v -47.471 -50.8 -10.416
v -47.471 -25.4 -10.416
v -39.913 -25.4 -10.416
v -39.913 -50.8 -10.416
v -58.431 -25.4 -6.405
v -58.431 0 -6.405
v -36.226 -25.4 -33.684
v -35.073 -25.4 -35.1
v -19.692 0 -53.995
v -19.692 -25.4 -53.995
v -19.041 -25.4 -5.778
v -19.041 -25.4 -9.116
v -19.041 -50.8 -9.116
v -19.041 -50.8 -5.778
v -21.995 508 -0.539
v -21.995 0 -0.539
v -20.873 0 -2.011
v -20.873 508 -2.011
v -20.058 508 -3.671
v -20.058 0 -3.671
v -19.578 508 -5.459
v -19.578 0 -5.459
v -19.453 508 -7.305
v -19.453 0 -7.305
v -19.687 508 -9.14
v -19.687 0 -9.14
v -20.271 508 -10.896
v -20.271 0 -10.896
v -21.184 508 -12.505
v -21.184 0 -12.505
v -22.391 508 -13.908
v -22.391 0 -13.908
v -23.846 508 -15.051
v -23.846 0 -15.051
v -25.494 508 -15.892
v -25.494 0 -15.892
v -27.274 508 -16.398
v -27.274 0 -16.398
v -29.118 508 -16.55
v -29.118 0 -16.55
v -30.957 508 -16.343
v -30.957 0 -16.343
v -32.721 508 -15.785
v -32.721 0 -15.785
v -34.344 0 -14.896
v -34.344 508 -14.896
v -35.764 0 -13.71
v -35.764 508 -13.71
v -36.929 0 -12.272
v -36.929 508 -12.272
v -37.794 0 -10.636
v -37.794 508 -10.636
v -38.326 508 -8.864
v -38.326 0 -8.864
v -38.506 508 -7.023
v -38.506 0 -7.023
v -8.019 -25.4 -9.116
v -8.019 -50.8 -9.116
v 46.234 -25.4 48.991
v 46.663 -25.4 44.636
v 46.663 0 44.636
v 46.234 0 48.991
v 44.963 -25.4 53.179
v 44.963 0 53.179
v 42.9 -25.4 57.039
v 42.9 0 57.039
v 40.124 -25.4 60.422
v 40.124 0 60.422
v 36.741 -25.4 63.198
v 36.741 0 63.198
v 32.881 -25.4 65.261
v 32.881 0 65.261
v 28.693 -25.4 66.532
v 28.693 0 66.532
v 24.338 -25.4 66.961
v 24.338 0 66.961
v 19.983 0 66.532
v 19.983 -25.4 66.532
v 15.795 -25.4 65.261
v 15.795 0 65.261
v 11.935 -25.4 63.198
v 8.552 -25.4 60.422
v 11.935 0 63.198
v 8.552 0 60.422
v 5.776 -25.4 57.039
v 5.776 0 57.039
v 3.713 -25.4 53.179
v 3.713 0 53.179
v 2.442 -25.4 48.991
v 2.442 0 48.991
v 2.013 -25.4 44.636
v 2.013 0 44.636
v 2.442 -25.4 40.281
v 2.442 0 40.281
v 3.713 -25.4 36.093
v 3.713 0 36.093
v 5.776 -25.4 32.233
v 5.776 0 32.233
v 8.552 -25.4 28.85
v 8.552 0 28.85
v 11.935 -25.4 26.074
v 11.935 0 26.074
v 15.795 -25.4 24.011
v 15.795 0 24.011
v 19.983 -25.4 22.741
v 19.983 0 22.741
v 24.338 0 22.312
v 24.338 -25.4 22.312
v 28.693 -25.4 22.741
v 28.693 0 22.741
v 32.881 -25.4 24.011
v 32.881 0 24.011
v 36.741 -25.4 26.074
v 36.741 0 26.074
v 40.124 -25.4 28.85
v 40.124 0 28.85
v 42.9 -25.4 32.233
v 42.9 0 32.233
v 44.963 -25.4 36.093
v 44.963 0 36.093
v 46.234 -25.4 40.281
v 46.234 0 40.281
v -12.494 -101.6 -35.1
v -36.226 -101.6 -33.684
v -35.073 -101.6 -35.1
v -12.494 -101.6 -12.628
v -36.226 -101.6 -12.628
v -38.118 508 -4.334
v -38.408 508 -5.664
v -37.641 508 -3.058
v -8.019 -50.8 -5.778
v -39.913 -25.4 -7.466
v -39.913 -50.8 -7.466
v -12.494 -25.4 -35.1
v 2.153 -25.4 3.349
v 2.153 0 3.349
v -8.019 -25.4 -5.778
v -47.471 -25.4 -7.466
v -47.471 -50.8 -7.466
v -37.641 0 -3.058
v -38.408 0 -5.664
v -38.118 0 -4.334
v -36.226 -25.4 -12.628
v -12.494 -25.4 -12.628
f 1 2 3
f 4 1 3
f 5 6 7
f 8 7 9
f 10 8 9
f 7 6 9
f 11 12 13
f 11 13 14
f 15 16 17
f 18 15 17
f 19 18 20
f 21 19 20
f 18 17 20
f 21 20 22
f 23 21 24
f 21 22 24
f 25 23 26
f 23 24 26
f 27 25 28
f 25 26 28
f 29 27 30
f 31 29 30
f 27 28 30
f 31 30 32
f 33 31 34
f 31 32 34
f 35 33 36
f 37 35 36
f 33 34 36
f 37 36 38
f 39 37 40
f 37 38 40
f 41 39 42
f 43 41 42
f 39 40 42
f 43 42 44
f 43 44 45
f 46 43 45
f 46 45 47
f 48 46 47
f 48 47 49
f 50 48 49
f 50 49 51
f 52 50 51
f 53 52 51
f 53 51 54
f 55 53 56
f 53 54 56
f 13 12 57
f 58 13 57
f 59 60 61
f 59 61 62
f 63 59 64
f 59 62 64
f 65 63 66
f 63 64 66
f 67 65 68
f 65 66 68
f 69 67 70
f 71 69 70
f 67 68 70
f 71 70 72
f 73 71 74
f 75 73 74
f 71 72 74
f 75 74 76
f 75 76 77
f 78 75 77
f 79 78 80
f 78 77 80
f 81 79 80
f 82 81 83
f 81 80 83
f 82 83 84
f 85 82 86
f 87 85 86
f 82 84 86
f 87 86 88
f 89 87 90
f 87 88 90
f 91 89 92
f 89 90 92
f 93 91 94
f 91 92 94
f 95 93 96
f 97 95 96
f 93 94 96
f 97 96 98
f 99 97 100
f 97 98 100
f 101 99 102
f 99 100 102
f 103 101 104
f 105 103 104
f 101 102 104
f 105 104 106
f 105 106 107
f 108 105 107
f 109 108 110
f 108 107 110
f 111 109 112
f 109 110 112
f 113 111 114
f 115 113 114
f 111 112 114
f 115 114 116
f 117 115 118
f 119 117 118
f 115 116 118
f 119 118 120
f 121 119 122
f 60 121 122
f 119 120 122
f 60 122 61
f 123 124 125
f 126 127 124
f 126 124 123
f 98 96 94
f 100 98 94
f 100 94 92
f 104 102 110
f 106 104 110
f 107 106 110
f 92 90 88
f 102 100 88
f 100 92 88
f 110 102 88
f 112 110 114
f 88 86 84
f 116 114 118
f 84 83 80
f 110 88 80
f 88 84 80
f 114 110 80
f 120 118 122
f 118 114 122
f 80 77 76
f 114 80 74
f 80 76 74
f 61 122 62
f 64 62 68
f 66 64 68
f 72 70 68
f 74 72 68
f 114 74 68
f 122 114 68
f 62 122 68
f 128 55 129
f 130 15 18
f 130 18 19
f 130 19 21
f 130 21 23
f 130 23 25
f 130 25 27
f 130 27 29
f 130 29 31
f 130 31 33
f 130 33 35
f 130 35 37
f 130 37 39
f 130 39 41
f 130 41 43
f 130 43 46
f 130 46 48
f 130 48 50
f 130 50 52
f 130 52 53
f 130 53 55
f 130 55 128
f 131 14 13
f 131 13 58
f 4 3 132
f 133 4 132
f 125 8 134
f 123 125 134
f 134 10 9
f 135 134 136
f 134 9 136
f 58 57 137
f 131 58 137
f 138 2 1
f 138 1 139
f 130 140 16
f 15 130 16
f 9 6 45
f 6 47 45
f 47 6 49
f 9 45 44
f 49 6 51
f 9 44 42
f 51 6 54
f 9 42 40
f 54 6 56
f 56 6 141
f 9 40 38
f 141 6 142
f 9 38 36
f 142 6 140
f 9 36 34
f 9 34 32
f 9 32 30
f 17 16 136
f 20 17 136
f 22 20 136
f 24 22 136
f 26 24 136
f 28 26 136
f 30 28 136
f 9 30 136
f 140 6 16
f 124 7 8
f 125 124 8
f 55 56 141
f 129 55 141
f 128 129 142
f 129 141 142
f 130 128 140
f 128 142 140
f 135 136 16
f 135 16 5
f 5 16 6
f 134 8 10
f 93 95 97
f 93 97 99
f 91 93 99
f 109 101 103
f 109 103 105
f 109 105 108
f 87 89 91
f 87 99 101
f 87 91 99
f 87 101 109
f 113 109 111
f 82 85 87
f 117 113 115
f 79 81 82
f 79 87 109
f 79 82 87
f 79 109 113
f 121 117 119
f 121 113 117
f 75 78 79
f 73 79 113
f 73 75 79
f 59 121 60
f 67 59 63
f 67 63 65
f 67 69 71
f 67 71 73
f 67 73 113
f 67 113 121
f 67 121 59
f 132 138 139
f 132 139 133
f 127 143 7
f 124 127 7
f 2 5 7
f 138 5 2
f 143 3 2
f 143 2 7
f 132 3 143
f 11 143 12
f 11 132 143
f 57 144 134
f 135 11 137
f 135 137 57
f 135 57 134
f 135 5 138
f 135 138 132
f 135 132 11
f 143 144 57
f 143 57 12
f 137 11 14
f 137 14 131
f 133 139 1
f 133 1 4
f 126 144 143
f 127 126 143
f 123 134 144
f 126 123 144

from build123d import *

# Parameters (mm, degrees)
F0_R      = 22.324529
F2_DEPTH  = 25.4
F4_DEPTH  = 508
F6_DEPTH  = 76.2
F7_W      = 7.558547
F7_H      = 2.949678
F8_DEPTH  = 25.4
F9_W      = 11.0225
F9_H      = 3.337407
F10_DEPTH = 25.4


with BuildPart() as f2:
    # F0 (on Front) + F1 (on Front) → F2 (new body)
    with BuildSketch(Plane.XZ):
        with Locations((24.338016, 44.636119)):
            Circle(F0_R)
    with BuildSketch(Plane.XZ):
        Polygon((-19.692236, -53.995373), (2.153098, 3.348651), (-58.430951, -6.404746), align=None)
    extrude(amount=F2_DEPTH)

    # F3 (on face) → F4 (join)
    with BuildSketch(Plane(origin=(0, 0, 0), x_dir=(-1, 0, 0), z_dir=(0, 1, 0))):
        with BuildLine():
            ThreePointArc((21.994989, -0.538938), (25.494237, -15.891751), (38.505543, -7.022732))
            ThreePointArc((38.505543, -7.022732), (38.287013, -4.993759), (37.641445, -3.057854))
            Line((37.641445, -3.057854), (21.994989, -0.538938))
        make_face()
    extrude(amount=F4_DEPTH)

    # F5 (on face) → F6 (join)
    with BuildSketch(Plane.XZ.offset(25.4)):
        Polygon((-12.494178, -12.628307), (-36.225725, -12.628307), (-36.225725, -33.683933), (-35.072671, -35.100463), (-12.494178, -35.100463), align=None)
    extrude(amount=F6_DEPTH)

    # F7 (on face) → F8 (join)
    with BuildSketch(Plane.XZ.offset(25.4)):
        with Locations((-43.692098, -8.94121)):
            Rectangle(F7_W, F7_H)
    extrude(amount=F8_DEPTH)

    # F9 (on face) → F10 (join)
    with BuildSketch(Plane.XZ.offset(25.4)):
        with Locations((-13.529864, -7.447115)):
            Rectangle(F9_W, F9_H)
    extrude(amount=F10_DEPTH)


solid = f2.part
